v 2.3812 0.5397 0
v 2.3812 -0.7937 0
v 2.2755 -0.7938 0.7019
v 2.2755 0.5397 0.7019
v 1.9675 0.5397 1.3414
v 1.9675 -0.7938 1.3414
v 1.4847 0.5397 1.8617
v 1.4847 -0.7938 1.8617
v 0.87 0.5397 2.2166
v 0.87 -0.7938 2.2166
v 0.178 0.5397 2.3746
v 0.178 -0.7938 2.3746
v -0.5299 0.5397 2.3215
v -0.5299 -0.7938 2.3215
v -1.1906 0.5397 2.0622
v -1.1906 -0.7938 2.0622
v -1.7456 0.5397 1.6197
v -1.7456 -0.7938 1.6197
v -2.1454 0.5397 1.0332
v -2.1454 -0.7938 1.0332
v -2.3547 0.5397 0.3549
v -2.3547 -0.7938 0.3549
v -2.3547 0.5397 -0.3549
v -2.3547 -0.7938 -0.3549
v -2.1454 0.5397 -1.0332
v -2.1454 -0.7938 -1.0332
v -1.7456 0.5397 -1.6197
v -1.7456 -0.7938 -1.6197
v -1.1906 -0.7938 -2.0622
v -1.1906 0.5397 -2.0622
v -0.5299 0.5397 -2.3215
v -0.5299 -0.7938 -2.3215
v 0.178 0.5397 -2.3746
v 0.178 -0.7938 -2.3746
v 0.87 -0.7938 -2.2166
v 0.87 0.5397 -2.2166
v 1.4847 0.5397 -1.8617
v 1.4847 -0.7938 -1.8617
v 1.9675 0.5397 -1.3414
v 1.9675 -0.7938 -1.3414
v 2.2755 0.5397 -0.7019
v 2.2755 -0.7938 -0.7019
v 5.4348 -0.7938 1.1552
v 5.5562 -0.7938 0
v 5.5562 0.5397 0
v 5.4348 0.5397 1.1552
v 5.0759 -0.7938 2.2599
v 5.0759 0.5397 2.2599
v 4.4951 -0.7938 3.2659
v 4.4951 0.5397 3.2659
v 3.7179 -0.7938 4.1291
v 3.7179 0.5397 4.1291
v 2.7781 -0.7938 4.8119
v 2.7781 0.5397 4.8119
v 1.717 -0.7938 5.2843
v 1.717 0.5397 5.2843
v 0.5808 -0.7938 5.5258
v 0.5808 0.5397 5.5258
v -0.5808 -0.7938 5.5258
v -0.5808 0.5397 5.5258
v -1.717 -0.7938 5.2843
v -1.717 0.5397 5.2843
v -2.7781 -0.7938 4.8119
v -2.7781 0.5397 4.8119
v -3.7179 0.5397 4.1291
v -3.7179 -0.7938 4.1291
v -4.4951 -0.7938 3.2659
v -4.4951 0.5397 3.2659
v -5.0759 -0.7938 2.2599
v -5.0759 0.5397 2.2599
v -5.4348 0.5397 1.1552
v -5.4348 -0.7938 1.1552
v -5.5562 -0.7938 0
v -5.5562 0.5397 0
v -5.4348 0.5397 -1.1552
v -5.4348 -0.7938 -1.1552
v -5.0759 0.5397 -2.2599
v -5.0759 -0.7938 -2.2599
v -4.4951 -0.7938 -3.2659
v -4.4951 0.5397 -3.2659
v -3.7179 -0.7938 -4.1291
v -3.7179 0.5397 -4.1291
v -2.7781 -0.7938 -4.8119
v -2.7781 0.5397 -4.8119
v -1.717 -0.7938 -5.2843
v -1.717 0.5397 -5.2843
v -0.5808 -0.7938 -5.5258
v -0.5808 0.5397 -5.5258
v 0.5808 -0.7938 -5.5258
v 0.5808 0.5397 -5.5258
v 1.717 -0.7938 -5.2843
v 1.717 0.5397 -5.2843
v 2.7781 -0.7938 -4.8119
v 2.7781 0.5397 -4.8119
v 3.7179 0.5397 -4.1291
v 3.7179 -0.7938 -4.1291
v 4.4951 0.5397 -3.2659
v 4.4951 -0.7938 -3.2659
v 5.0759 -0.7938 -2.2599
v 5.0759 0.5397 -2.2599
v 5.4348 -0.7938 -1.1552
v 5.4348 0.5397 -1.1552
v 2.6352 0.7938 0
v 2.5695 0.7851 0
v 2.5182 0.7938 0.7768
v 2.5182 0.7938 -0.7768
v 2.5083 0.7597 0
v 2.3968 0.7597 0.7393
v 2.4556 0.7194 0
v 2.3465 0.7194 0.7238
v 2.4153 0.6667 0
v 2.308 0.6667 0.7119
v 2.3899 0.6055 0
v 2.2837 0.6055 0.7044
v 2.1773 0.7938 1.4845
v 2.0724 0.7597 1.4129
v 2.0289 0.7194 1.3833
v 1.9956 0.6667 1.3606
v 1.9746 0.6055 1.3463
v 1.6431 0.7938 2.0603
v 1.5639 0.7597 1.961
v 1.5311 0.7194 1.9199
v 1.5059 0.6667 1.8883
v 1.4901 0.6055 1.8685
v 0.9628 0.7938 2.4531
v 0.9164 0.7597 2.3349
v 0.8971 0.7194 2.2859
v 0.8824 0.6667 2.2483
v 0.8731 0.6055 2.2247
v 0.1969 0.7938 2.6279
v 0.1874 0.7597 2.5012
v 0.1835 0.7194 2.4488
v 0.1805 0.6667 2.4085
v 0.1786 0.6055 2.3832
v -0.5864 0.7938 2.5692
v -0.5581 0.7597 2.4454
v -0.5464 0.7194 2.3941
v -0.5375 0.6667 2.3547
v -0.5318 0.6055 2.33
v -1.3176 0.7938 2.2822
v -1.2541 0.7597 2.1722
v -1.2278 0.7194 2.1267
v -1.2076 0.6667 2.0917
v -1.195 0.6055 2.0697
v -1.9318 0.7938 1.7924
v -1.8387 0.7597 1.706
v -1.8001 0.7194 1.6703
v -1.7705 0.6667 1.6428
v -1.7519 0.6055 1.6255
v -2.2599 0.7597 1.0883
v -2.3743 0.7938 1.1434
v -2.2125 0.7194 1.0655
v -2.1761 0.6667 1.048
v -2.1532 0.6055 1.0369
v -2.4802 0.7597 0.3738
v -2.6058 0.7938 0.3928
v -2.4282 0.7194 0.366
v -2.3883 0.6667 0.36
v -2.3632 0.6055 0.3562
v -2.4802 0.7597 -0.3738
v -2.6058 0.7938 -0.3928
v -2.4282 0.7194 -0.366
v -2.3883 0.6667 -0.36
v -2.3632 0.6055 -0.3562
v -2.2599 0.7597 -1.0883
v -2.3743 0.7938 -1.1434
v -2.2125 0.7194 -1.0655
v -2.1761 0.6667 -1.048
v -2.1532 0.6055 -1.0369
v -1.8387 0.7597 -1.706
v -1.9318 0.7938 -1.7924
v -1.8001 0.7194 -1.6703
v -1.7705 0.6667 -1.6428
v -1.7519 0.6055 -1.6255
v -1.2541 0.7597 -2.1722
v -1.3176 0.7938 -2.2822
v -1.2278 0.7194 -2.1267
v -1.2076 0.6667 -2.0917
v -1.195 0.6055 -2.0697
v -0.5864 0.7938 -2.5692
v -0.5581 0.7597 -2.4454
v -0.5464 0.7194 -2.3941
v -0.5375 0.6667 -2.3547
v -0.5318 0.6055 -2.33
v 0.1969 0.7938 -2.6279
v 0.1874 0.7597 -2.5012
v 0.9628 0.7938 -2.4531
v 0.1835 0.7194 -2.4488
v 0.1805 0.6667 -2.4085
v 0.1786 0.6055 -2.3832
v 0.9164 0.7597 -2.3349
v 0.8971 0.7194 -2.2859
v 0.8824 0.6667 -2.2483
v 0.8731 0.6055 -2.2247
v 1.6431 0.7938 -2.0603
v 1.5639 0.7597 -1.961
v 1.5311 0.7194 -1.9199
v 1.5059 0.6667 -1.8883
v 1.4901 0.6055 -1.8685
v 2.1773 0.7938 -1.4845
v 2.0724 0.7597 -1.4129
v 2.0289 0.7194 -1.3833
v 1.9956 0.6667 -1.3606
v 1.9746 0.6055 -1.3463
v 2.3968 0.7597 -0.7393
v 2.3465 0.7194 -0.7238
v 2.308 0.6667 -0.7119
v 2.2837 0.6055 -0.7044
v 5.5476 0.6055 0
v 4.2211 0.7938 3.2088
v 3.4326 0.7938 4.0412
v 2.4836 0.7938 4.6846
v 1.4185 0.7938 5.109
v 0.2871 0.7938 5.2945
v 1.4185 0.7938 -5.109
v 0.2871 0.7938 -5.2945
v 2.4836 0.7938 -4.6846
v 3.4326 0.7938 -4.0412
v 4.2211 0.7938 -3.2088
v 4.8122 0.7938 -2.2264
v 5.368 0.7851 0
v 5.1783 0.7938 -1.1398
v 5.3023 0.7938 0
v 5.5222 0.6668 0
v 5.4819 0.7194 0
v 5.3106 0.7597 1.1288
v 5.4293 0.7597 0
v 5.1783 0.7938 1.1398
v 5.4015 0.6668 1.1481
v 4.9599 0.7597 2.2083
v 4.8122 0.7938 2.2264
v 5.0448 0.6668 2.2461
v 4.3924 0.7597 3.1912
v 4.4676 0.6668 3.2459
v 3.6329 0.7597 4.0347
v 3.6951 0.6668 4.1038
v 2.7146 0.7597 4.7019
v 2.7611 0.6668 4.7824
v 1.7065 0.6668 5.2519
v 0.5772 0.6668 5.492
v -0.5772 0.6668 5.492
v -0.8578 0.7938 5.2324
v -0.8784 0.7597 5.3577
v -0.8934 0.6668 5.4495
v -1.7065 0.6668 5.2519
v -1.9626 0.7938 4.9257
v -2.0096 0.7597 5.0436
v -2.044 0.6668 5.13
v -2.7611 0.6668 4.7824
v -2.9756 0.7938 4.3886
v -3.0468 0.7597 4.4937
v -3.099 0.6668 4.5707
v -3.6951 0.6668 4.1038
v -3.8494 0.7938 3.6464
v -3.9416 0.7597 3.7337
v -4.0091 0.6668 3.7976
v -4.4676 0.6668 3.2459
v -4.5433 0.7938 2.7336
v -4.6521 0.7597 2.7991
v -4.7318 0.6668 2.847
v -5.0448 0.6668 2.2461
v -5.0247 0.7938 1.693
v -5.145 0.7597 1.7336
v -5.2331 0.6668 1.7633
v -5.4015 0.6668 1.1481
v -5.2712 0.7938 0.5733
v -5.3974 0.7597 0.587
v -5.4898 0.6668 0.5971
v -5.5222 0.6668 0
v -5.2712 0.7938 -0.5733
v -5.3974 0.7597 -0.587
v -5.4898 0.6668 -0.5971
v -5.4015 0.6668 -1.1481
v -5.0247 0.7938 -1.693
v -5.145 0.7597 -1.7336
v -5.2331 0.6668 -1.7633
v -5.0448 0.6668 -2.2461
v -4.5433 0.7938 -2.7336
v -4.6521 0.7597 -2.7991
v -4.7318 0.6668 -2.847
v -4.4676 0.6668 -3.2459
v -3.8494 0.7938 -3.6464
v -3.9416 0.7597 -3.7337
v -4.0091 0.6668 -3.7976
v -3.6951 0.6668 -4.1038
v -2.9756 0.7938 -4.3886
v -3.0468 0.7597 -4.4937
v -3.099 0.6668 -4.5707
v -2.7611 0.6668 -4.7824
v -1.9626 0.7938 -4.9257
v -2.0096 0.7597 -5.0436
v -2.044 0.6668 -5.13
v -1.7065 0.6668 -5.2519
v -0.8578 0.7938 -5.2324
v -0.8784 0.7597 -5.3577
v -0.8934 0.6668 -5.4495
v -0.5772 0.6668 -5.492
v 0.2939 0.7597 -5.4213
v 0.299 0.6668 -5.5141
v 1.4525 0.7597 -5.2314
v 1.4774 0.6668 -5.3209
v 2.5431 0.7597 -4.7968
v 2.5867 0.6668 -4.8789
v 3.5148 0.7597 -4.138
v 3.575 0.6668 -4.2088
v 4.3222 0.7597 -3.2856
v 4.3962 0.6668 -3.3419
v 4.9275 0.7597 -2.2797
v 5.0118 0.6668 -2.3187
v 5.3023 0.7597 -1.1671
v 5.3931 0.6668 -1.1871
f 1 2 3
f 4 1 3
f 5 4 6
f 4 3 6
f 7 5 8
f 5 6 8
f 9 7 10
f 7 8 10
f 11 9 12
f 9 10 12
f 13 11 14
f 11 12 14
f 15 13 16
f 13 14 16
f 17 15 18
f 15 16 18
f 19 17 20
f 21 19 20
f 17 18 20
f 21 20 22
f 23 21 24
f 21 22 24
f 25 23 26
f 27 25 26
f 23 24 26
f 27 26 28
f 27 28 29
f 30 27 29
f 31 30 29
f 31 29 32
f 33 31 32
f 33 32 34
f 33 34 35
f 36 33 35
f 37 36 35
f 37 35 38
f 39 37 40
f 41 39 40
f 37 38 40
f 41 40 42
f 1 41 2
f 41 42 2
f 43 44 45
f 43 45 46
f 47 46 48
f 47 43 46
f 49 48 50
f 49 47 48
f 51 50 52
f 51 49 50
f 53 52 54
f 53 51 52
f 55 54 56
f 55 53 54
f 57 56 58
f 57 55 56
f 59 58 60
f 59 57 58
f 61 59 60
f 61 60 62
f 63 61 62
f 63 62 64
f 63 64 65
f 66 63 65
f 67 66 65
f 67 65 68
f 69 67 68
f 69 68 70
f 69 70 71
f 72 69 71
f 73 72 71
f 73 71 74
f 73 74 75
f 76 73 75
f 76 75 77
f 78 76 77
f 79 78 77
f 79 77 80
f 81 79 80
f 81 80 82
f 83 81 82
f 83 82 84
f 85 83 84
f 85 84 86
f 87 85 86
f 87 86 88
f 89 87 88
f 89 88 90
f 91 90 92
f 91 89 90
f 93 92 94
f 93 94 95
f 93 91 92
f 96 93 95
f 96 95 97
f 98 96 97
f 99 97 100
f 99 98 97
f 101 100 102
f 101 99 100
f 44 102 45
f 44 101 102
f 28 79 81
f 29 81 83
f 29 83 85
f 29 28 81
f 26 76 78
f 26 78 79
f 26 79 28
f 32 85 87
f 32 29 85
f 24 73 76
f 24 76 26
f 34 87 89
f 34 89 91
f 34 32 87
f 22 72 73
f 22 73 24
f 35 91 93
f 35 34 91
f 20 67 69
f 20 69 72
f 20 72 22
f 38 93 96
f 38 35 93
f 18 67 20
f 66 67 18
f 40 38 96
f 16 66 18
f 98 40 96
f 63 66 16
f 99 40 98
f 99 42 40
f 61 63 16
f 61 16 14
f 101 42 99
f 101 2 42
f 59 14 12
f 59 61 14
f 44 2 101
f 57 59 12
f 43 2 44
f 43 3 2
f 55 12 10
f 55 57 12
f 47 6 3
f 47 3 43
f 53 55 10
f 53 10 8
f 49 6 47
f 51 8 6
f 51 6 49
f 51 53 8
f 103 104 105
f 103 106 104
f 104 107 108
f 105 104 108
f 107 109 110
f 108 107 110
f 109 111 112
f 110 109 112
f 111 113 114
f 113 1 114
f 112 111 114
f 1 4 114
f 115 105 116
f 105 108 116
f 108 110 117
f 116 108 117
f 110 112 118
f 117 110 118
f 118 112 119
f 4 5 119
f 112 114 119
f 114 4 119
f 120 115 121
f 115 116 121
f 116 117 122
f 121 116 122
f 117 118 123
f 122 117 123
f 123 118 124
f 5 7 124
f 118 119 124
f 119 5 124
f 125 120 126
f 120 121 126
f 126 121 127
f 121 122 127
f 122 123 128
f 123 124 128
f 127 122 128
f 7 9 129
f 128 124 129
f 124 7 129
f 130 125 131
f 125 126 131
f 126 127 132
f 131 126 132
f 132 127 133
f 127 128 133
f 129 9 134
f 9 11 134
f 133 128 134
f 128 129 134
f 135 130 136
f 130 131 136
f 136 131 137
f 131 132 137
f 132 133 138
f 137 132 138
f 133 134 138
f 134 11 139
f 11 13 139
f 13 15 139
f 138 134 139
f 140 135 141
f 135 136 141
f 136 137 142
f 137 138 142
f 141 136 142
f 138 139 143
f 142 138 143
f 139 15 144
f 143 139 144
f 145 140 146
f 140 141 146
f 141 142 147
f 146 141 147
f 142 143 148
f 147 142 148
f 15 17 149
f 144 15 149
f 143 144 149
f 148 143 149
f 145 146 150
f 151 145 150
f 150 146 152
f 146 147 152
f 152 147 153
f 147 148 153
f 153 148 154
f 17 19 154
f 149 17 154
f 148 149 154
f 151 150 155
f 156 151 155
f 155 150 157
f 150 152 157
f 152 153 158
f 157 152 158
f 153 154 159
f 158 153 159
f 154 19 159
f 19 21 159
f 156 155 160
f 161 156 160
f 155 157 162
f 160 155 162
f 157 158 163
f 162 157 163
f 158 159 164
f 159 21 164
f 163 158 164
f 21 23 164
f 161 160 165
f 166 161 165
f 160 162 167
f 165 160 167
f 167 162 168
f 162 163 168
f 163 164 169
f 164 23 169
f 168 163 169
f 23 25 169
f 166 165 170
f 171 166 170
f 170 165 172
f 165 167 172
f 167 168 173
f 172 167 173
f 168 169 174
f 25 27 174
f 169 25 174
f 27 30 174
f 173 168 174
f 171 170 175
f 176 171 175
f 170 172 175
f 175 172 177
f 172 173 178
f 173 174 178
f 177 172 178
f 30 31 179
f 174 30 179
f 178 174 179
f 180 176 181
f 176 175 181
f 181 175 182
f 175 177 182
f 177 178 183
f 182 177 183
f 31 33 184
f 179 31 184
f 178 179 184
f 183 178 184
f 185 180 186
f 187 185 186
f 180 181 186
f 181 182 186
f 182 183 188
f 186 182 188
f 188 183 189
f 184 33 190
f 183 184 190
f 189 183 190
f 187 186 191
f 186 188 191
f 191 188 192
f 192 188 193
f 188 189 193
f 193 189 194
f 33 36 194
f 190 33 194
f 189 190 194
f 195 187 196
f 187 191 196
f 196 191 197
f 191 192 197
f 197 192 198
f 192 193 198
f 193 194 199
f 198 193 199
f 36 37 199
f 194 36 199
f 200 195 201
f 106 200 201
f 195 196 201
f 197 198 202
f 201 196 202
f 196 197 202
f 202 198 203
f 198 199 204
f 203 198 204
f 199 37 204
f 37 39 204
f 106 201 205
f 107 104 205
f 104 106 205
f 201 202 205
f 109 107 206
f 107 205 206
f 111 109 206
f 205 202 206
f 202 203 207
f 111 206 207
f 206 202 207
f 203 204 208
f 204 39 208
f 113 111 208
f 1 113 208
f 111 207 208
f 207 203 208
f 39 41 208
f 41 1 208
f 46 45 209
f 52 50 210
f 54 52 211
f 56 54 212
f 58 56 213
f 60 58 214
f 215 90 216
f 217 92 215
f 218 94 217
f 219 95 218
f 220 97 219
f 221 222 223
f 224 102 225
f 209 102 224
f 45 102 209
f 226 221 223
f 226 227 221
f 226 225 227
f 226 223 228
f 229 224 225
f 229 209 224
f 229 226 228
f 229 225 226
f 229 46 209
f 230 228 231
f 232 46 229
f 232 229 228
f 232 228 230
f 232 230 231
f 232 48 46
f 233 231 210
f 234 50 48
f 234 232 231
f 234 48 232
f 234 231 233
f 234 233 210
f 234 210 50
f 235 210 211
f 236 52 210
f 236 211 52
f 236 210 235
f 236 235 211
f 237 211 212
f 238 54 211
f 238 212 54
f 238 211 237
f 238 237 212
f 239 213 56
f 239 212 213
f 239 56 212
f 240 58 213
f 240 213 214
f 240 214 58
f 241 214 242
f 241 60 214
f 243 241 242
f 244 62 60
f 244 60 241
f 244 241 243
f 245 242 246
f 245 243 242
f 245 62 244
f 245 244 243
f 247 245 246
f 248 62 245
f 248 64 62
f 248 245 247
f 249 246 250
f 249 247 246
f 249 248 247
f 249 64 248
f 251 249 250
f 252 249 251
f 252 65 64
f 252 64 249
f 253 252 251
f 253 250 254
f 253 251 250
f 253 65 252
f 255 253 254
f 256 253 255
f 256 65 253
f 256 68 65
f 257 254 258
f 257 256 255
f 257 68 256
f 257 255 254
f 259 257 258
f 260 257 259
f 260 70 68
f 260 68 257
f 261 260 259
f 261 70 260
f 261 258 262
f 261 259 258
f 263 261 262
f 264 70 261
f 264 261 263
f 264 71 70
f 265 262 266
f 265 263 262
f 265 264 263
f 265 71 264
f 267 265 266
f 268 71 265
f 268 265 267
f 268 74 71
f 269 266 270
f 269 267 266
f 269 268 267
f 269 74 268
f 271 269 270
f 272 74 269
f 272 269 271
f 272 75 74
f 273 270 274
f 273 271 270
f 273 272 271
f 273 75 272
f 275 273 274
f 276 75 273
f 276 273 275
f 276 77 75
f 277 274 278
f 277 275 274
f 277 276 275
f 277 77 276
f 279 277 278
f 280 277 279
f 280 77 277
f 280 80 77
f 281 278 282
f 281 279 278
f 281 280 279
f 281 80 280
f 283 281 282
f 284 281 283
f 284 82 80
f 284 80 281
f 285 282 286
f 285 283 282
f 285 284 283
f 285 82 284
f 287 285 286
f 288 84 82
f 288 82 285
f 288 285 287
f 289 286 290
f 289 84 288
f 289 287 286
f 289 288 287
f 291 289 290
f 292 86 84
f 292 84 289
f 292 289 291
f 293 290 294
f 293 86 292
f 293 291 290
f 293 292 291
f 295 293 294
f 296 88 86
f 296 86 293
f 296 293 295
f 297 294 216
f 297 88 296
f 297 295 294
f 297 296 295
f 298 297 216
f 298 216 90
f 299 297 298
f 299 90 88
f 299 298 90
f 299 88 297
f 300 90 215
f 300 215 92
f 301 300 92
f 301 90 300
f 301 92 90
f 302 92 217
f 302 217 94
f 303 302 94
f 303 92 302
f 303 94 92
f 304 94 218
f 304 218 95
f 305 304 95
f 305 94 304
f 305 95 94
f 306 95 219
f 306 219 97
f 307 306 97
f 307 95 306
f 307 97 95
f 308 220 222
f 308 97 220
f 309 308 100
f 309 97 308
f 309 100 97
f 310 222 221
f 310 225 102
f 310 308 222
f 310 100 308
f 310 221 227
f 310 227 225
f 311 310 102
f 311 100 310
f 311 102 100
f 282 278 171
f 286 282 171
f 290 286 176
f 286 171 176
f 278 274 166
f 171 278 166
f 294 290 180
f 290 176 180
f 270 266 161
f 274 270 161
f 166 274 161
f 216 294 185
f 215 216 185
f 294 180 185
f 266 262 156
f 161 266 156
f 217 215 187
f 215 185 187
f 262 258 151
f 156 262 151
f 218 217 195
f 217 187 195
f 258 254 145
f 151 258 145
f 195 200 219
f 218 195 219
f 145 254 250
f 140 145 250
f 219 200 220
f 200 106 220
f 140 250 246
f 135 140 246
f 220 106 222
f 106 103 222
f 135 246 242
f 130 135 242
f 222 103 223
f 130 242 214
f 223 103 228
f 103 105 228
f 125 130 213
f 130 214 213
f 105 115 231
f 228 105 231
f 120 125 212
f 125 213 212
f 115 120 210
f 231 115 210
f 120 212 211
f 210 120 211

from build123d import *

# Parameters (mm, degrees)
F0_R     = 5.55625
F1_DEPTH = 0.79375
F2_R     = 2.38125
F3_DEPTH = 25.4
F4_R     = 0.254
F5_R     = 0.254


with BuildPart() as f1:
    # F0 (on Front) → F1 (new body, symmetric)
    with BuildSketch(Plane.XZ):
        Circle(F0_R)
    extrude(amount=F1_DEPTH, both=True)

    # F2 (on Front) → F3 (cut, symmetric)
    with BuildSketch(Plane.XZ):
        Circle(F2_R)
    extrude(amount=F3_DEPTH, both=True, mode=Mode.SUBTRACT)

    # F4
    f4_edges = [f1.edges().sort_by_distance(p)[0] for p in [
        (-2.38125, 0.79375, 0),
    ]]
    fillet(f4_edges, radius=F4_R)

    # F5
    f5_edges = [f1.edges().sort_by_distance(p)[0] for p in [
        (-5.55625, 0.79375, 0),
    ]]
    fillet(f5_edges, radius=F5_R)


solid = f1.part
